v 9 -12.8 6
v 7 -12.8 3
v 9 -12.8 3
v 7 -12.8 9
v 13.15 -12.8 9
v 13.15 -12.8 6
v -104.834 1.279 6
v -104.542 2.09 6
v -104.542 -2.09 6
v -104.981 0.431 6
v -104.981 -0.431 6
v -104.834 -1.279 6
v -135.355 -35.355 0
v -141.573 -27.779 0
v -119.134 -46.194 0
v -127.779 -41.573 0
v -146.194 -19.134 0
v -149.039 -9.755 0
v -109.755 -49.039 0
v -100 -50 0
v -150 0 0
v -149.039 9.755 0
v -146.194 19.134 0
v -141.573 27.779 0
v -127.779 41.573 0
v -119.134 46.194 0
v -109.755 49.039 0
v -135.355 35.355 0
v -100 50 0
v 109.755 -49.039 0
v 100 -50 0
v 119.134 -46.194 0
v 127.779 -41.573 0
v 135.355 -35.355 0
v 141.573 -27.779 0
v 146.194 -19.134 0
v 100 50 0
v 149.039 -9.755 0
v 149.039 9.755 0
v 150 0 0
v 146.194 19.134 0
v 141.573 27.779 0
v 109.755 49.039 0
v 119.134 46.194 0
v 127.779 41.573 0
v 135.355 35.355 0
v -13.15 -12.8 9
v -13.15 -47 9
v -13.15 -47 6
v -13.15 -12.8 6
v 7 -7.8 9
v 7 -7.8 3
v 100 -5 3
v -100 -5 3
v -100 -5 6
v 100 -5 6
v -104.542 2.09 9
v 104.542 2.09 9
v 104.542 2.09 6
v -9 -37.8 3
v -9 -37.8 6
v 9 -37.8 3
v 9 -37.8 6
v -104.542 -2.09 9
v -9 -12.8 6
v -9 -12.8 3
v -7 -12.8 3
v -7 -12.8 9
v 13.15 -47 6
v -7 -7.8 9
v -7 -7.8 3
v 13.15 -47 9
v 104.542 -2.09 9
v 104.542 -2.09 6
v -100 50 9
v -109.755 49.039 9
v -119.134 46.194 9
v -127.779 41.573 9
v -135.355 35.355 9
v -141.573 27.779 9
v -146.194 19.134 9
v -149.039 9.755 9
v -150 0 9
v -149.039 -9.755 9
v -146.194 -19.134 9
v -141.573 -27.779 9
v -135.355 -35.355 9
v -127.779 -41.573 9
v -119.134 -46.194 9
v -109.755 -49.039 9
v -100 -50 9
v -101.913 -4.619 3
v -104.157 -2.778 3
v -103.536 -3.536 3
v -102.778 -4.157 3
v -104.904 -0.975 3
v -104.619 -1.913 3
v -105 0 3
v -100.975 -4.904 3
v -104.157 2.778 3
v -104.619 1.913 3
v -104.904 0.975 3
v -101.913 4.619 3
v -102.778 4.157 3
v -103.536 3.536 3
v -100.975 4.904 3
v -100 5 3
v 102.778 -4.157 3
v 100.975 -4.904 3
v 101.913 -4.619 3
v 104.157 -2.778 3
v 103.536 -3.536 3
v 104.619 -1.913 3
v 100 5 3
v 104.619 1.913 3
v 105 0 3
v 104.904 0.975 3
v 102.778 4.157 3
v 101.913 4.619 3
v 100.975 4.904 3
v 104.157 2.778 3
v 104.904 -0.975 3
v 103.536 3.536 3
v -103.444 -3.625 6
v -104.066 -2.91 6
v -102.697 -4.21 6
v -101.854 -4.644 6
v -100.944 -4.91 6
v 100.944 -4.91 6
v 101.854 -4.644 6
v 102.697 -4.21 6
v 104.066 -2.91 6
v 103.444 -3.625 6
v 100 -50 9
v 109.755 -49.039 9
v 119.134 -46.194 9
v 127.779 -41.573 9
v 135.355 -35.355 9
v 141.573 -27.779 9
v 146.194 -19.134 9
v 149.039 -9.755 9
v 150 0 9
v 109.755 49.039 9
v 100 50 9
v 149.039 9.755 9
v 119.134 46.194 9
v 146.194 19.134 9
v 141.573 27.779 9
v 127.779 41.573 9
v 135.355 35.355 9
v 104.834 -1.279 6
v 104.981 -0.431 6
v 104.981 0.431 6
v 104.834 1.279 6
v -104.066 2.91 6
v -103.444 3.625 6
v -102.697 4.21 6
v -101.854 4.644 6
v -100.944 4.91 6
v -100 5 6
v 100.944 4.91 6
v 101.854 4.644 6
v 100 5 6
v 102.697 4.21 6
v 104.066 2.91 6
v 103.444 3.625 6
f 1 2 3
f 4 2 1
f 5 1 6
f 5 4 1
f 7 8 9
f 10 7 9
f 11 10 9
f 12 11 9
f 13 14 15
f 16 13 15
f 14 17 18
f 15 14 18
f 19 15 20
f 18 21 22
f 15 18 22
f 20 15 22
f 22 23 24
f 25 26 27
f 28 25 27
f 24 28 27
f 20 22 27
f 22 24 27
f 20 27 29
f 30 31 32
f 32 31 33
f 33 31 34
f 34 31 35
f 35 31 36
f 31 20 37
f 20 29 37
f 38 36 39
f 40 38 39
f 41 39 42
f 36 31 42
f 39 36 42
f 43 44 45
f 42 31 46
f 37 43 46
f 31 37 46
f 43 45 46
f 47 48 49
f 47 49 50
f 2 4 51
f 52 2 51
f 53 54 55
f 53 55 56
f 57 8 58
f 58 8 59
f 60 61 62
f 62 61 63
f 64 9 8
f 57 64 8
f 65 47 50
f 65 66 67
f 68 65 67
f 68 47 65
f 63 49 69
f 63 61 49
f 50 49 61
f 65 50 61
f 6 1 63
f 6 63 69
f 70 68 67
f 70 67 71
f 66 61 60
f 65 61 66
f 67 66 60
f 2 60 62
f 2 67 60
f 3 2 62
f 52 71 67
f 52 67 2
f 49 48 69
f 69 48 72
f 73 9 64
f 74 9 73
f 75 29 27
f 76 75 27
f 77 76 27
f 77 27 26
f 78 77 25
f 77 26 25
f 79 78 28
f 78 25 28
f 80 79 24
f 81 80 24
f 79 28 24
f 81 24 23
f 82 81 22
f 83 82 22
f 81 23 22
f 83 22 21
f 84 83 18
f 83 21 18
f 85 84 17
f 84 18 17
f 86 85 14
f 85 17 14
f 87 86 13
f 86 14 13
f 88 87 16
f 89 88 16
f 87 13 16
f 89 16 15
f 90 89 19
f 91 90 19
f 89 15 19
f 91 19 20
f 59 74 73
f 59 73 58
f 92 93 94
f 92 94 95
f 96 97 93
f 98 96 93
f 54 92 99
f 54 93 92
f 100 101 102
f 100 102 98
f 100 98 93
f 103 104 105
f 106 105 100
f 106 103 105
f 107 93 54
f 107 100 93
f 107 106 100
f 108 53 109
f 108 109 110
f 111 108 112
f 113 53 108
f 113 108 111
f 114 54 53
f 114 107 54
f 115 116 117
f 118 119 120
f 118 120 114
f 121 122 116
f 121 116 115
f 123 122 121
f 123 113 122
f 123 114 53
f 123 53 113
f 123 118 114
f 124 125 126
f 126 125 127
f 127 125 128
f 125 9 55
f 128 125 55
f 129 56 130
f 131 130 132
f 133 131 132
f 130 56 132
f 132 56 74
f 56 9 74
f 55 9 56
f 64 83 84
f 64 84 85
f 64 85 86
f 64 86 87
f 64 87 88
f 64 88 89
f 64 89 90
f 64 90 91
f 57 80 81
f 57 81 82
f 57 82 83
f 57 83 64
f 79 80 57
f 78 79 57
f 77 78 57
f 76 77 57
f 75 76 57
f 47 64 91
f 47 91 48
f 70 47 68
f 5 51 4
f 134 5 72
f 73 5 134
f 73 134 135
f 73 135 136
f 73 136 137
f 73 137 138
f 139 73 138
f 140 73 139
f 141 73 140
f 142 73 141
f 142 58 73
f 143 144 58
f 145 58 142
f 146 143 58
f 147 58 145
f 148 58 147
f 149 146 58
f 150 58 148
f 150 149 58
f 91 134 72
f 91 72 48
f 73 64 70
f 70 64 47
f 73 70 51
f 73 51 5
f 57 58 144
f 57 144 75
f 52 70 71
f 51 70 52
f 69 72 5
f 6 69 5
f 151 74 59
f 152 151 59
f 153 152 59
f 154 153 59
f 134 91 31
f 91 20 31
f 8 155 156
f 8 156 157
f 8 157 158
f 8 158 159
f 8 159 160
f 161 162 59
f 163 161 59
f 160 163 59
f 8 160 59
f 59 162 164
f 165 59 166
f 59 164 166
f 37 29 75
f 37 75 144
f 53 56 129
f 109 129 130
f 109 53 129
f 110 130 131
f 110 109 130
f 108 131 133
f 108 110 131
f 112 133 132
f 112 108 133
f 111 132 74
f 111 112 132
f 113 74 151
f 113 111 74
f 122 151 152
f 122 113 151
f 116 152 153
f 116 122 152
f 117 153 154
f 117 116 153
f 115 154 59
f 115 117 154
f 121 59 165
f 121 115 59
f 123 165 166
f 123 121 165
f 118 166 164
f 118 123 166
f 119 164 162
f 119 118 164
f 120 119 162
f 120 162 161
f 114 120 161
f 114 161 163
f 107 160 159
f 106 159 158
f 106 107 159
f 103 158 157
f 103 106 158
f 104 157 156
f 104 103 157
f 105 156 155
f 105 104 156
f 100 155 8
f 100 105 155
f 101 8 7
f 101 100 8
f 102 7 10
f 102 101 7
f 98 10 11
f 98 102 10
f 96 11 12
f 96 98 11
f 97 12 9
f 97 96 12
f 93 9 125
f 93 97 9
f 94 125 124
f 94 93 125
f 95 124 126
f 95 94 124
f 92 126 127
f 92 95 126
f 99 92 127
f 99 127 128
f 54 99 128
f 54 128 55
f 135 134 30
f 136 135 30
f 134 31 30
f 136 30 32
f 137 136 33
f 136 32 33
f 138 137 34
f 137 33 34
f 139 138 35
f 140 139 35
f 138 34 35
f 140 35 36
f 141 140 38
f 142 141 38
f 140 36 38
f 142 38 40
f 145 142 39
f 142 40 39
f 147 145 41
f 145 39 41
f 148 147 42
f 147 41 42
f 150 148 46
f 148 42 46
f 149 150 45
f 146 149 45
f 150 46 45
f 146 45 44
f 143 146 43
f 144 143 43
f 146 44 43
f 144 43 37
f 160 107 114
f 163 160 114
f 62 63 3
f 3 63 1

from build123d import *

# Parameters (mm, degrees)
PAD_DEPTH       = 3
PAD001_DEPTH    = 3
SKETCH002_W     = 209.08447
SKETCH002_H     = 4.18
PAD002_DEPTH    = 3
SKETCH003_W     = 26.3
SKETCH003_H     = 34.2
POCKET_DEPTH    = 3
SKETCH004_W     = 18
SKETCH004_H     = 25
POCKET001_DEPTH = 3
SKETCH005_W     = 14
SKETCH005_H     = 5
POCKET002_DEPTH = 6


with BuildPart() as part:
    # Sketch → Pad (new body)
    with BuildSketch(Plane.XY):
        with BuildLine():
            ThreePointArc((-100, 50), (-150, 0), (-100, -50))
            Line((-100, -50), (100, -50))
            ThreePointArc((100, -50), (150, 0), (100, 50))
            Line((-100, 50), (100, 50))
        make_face()
    extrude(amount=PAD_DEPTH)

    # Sketch001 (on Face6 of Pad) → Pad001 (join)
    with BuildSketch(Plane.XY.offset(3)):
        with BuildLine():
            ThreePointArc((-100, 50), (-150, 0), (-100, -50))
            Line((-100, -50), (100, -50))
            ThreePointArc((100, -50), (150, 0), (100, 50))
            Line((-100, 50), (100, 50))
        make_face()
        with BuildLine():
            ThreePointArc((-100, 5), (-105, 0), (-100, -5))
            Line((-100, -5), (100, -5))
            ThreePointArc((100, -5), (105, 0), (100, 5))
            Line((-100, 5), (100, 5))
        make_face(mode=Mode.SUBTRACT)
    extrude(amount=PAD001_DEPTH)

    # Sketch002 (on Face9 of Pad001) → Pad002 (join)
    with BuildSketch(Plane.XY.offset(6)):
        with BuildLine():
            ThreePointArc((-100, 50), (-150, 0), (-100, -50))
            Line((-100, -50), (100, -50))
            ThreePointArc((100, -50), (150, 0), (100, 50))
            Line((-100, 50), (100, 50))
        make_face()
        Rectangle(SKETCH002_W, SKETCH002_H, mode=Mode.SUBTRACT)
    extrude(amount=PAD002_DEPTH)

    # Sketch003 (on Face13 of Pad002) → Pocket (cut)
    with BuildSketch(Plane.XY.offset(9)):
        with Locations((0, -29.9)):
            Rectangle(SKETCH003_W, SKETCH003_H)
    extrude(amount=-POCKET_DEPTH, mode=Mode.SUBTRACT)

    # Sketch004 (on Face27 of Pocket) → Pocket001 (cut)
    with BuildSketch(Plane.XY.offset(6)):
        with Locations((0, -25.3)):
            Rectangle(SKETCH004_W, SKETCH004_H)
    extrude(amount=-POCKET001_DEPTH, mode=Mode.SUBTRACT)

    # Sketch005 (on Face13 of Pocket001) → Pocket002 (cut)
    with BuildSketch(Plane.XY.offset(9)):
        with Locations((0, -10.3)):
            Rectangle(SKETCH005_W, SKETCH005_H)
    extrude(amount=-POCKET002_DEPTH, mode=Mode.SUBTRACT)


solid = part.part
